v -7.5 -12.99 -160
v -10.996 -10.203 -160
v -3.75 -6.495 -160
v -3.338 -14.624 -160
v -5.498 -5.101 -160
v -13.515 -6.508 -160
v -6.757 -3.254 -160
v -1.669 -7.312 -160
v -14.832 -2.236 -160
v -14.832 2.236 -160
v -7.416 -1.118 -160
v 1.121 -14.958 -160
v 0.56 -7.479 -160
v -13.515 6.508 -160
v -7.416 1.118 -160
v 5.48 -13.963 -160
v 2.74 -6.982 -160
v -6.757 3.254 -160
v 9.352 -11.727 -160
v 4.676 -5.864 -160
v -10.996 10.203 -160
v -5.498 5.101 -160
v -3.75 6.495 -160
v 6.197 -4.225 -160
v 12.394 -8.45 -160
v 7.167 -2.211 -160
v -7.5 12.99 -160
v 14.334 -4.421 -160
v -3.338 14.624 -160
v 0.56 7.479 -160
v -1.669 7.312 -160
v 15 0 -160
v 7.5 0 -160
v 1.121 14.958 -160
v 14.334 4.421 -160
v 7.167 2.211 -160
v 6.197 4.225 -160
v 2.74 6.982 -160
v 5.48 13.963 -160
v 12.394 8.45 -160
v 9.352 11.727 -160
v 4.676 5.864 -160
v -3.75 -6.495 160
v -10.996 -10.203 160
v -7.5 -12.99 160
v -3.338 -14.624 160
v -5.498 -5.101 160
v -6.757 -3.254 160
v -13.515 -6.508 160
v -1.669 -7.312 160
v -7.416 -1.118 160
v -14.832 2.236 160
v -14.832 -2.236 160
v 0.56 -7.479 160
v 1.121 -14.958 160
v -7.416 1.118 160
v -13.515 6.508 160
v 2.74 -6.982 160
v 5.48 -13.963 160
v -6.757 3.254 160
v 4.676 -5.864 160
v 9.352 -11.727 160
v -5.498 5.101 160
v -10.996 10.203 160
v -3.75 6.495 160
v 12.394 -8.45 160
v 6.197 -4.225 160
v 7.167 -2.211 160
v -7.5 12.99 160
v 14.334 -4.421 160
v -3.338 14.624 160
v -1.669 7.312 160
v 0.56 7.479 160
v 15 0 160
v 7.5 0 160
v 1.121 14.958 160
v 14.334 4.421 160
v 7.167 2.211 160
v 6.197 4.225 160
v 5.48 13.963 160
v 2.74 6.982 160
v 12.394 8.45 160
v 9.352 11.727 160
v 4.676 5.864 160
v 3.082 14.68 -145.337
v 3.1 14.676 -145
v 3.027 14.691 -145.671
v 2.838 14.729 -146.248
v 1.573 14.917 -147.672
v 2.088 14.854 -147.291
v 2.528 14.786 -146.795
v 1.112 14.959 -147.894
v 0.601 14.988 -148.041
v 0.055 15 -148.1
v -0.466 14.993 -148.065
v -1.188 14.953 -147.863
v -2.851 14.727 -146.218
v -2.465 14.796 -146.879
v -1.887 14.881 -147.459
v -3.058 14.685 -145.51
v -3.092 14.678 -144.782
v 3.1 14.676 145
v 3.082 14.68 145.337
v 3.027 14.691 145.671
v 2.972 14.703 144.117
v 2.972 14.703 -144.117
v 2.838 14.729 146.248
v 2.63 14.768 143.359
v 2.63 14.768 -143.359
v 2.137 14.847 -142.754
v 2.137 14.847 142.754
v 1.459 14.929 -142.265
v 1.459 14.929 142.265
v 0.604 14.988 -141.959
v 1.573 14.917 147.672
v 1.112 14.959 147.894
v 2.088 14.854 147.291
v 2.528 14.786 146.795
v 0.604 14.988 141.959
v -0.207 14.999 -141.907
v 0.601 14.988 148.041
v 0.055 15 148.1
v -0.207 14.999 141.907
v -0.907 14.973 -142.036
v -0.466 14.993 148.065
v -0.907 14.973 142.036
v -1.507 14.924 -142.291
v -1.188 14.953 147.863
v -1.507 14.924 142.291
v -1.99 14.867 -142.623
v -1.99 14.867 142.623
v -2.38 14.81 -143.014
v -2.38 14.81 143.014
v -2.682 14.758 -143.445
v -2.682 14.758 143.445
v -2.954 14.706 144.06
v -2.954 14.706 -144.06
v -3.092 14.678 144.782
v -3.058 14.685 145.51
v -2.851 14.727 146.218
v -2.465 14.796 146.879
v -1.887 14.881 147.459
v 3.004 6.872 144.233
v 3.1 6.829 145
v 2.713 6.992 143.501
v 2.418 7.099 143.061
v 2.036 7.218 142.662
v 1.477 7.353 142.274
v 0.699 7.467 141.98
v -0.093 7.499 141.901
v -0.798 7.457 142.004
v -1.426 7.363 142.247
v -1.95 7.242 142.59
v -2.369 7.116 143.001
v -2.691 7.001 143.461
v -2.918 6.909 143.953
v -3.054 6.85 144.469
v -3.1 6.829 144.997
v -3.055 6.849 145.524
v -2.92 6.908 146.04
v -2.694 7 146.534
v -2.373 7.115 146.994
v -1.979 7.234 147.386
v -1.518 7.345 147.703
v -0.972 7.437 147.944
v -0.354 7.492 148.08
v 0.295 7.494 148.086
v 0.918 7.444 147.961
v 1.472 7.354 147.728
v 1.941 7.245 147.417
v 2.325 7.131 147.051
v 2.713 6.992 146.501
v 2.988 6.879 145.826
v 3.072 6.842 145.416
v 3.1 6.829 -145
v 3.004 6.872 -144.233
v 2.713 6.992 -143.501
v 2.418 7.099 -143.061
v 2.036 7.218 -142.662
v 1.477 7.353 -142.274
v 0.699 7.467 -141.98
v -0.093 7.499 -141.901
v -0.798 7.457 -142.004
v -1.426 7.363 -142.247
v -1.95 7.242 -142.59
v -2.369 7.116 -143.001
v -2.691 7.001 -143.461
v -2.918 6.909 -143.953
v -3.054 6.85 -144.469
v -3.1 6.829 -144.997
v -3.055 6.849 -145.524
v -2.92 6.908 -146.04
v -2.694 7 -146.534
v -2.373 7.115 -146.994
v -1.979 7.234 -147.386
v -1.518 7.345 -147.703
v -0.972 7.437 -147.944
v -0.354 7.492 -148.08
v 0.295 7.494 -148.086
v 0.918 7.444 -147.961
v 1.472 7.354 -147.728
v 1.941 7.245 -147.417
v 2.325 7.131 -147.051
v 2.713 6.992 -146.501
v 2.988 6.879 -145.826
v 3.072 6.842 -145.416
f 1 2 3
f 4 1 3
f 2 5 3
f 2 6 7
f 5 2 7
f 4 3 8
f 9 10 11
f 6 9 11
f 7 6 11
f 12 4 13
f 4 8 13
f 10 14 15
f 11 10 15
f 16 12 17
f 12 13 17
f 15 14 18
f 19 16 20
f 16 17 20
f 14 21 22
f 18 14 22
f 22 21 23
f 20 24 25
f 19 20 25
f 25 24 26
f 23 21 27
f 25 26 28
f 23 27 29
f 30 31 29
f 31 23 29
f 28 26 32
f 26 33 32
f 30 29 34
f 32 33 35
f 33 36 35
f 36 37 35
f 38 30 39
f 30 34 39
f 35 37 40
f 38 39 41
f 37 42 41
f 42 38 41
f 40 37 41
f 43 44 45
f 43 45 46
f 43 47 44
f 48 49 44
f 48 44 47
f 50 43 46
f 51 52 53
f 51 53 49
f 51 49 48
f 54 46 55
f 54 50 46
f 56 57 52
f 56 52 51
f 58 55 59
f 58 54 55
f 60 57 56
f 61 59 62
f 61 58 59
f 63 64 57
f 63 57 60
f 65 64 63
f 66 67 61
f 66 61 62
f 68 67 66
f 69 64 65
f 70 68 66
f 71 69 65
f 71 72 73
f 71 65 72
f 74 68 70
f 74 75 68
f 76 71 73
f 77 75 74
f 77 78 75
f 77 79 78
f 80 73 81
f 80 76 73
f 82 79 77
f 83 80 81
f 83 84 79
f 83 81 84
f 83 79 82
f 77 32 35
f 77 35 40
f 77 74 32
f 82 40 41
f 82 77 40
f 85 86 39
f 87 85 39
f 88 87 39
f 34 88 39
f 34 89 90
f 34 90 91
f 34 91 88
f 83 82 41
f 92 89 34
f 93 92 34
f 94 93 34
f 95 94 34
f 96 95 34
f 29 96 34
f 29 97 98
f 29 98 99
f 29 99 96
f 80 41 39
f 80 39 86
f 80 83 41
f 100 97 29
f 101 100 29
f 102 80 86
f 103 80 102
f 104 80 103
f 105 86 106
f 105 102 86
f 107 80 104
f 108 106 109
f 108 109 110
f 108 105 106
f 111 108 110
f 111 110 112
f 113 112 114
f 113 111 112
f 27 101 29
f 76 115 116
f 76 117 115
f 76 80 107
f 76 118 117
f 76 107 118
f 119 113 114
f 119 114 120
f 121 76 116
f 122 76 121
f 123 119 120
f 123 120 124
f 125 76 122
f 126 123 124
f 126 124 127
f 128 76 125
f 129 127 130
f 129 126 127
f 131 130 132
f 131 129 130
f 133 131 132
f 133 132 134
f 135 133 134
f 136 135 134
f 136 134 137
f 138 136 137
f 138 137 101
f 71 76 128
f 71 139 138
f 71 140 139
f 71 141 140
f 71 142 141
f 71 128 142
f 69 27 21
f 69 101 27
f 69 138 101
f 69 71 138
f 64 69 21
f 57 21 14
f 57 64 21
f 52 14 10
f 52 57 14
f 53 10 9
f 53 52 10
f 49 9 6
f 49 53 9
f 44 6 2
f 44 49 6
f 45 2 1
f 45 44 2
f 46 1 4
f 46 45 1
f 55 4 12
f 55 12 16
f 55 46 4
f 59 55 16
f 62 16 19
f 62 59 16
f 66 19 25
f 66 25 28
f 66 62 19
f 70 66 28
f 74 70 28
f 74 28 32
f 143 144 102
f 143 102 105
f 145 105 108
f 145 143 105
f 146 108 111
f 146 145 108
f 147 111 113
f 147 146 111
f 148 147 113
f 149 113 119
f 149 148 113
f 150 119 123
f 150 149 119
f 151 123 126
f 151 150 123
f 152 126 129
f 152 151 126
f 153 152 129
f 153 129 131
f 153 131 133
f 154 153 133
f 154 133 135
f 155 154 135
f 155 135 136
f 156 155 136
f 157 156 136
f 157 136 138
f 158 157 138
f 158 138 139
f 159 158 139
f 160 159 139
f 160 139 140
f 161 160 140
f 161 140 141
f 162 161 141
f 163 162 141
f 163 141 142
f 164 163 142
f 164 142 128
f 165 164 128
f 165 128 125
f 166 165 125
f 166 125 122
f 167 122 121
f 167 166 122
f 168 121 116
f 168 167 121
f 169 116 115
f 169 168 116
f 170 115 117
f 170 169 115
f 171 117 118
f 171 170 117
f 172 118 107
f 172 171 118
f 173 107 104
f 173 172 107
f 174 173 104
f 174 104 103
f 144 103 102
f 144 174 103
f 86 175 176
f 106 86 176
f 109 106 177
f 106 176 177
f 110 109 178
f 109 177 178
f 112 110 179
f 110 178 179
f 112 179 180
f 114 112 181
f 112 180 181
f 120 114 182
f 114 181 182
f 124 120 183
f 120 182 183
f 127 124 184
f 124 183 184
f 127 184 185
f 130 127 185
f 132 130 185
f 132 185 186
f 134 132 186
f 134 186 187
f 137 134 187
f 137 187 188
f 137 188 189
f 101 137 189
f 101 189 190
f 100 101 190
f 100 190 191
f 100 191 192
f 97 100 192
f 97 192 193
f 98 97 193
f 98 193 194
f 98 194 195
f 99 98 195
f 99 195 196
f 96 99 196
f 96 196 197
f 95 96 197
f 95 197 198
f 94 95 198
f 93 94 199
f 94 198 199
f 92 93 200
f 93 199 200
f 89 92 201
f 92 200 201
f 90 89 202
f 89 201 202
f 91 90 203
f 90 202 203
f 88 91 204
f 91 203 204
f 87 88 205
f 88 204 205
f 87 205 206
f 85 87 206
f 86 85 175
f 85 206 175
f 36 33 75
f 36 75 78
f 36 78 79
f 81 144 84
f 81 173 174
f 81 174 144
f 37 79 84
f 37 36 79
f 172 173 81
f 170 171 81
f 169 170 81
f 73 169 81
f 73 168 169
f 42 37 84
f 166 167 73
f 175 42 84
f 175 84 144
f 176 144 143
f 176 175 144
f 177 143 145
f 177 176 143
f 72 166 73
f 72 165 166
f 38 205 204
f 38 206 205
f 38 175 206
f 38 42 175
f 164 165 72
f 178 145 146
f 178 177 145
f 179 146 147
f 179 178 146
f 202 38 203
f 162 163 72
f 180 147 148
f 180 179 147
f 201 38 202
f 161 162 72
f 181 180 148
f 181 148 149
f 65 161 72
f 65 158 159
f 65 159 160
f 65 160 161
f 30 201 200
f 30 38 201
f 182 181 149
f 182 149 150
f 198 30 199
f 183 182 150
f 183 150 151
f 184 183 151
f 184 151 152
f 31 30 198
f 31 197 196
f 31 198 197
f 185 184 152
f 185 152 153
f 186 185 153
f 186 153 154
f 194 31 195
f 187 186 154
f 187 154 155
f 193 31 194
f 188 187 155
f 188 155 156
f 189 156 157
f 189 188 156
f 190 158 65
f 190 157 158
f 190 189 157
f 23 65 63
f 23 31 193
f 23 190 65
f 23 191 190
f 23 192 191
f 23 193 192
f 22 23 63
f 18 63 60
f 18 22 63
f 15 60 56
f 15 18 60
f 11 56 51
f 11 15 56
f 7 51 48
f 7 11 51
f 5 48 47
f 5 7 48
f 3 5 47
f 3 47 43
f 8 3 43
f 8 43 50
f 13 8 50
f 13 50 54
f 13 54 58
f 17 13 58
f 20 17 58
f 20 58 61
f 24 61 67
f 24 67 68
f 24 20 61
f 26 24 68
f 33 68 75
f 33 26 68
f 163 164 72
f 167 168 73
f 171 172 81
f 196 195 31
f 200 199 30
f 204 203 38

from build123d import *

# Parameters (mm, degrees)
BOSS_EXTRUDE1_DEPTH      = 160
BOSS_EXTRUDE1_DEPTH_BACK = 160
SKETCH1_R                = 15
SKETCH1_R_2              = 7.5
SKETCH2_R                = 3.1
CUT_EXTRUDE1_DEPTH       = 162.400123916


with BuildPart() as part:
    # Sketch1 → Boss-Extrude1 (new, two sides: drawn at the far end of the back side and taken through both)
    with BuildSketch(Plane.XY.offset(-BOSS_EXTRUDE1_DEPTH_BACK)):
        Circle(SKETCH1_R)
        Circle(SKETCH1_R_2, mode=Mode.SUBTRACT)
    extrude(amount=BOSS_EXTRUDE1_DEPTH + BOSS_EXTRUDE1_DEPTH_BACK)

    # Sketch2 → Cut-Extrude1 (cut, through all)
    with BuildSketch(Plane(origin=(0, 0, 0), x_dir=(1, 0, 0), z_dir=(0, 1, 0))):
        with Locations((0, -145)):
            Circle(SKETCH2_R)
    cut_extrude1 = extrude(amount=CUT_EXTRUDE1_DEPTH, mode=Mode.SUBTRACT)

    # Mirror1: Cut-Extrude1 across plane
    add(cut_extrude1.mirror(Plane.XY), mode=Mode.SUBTRACT)


solid = part.part
